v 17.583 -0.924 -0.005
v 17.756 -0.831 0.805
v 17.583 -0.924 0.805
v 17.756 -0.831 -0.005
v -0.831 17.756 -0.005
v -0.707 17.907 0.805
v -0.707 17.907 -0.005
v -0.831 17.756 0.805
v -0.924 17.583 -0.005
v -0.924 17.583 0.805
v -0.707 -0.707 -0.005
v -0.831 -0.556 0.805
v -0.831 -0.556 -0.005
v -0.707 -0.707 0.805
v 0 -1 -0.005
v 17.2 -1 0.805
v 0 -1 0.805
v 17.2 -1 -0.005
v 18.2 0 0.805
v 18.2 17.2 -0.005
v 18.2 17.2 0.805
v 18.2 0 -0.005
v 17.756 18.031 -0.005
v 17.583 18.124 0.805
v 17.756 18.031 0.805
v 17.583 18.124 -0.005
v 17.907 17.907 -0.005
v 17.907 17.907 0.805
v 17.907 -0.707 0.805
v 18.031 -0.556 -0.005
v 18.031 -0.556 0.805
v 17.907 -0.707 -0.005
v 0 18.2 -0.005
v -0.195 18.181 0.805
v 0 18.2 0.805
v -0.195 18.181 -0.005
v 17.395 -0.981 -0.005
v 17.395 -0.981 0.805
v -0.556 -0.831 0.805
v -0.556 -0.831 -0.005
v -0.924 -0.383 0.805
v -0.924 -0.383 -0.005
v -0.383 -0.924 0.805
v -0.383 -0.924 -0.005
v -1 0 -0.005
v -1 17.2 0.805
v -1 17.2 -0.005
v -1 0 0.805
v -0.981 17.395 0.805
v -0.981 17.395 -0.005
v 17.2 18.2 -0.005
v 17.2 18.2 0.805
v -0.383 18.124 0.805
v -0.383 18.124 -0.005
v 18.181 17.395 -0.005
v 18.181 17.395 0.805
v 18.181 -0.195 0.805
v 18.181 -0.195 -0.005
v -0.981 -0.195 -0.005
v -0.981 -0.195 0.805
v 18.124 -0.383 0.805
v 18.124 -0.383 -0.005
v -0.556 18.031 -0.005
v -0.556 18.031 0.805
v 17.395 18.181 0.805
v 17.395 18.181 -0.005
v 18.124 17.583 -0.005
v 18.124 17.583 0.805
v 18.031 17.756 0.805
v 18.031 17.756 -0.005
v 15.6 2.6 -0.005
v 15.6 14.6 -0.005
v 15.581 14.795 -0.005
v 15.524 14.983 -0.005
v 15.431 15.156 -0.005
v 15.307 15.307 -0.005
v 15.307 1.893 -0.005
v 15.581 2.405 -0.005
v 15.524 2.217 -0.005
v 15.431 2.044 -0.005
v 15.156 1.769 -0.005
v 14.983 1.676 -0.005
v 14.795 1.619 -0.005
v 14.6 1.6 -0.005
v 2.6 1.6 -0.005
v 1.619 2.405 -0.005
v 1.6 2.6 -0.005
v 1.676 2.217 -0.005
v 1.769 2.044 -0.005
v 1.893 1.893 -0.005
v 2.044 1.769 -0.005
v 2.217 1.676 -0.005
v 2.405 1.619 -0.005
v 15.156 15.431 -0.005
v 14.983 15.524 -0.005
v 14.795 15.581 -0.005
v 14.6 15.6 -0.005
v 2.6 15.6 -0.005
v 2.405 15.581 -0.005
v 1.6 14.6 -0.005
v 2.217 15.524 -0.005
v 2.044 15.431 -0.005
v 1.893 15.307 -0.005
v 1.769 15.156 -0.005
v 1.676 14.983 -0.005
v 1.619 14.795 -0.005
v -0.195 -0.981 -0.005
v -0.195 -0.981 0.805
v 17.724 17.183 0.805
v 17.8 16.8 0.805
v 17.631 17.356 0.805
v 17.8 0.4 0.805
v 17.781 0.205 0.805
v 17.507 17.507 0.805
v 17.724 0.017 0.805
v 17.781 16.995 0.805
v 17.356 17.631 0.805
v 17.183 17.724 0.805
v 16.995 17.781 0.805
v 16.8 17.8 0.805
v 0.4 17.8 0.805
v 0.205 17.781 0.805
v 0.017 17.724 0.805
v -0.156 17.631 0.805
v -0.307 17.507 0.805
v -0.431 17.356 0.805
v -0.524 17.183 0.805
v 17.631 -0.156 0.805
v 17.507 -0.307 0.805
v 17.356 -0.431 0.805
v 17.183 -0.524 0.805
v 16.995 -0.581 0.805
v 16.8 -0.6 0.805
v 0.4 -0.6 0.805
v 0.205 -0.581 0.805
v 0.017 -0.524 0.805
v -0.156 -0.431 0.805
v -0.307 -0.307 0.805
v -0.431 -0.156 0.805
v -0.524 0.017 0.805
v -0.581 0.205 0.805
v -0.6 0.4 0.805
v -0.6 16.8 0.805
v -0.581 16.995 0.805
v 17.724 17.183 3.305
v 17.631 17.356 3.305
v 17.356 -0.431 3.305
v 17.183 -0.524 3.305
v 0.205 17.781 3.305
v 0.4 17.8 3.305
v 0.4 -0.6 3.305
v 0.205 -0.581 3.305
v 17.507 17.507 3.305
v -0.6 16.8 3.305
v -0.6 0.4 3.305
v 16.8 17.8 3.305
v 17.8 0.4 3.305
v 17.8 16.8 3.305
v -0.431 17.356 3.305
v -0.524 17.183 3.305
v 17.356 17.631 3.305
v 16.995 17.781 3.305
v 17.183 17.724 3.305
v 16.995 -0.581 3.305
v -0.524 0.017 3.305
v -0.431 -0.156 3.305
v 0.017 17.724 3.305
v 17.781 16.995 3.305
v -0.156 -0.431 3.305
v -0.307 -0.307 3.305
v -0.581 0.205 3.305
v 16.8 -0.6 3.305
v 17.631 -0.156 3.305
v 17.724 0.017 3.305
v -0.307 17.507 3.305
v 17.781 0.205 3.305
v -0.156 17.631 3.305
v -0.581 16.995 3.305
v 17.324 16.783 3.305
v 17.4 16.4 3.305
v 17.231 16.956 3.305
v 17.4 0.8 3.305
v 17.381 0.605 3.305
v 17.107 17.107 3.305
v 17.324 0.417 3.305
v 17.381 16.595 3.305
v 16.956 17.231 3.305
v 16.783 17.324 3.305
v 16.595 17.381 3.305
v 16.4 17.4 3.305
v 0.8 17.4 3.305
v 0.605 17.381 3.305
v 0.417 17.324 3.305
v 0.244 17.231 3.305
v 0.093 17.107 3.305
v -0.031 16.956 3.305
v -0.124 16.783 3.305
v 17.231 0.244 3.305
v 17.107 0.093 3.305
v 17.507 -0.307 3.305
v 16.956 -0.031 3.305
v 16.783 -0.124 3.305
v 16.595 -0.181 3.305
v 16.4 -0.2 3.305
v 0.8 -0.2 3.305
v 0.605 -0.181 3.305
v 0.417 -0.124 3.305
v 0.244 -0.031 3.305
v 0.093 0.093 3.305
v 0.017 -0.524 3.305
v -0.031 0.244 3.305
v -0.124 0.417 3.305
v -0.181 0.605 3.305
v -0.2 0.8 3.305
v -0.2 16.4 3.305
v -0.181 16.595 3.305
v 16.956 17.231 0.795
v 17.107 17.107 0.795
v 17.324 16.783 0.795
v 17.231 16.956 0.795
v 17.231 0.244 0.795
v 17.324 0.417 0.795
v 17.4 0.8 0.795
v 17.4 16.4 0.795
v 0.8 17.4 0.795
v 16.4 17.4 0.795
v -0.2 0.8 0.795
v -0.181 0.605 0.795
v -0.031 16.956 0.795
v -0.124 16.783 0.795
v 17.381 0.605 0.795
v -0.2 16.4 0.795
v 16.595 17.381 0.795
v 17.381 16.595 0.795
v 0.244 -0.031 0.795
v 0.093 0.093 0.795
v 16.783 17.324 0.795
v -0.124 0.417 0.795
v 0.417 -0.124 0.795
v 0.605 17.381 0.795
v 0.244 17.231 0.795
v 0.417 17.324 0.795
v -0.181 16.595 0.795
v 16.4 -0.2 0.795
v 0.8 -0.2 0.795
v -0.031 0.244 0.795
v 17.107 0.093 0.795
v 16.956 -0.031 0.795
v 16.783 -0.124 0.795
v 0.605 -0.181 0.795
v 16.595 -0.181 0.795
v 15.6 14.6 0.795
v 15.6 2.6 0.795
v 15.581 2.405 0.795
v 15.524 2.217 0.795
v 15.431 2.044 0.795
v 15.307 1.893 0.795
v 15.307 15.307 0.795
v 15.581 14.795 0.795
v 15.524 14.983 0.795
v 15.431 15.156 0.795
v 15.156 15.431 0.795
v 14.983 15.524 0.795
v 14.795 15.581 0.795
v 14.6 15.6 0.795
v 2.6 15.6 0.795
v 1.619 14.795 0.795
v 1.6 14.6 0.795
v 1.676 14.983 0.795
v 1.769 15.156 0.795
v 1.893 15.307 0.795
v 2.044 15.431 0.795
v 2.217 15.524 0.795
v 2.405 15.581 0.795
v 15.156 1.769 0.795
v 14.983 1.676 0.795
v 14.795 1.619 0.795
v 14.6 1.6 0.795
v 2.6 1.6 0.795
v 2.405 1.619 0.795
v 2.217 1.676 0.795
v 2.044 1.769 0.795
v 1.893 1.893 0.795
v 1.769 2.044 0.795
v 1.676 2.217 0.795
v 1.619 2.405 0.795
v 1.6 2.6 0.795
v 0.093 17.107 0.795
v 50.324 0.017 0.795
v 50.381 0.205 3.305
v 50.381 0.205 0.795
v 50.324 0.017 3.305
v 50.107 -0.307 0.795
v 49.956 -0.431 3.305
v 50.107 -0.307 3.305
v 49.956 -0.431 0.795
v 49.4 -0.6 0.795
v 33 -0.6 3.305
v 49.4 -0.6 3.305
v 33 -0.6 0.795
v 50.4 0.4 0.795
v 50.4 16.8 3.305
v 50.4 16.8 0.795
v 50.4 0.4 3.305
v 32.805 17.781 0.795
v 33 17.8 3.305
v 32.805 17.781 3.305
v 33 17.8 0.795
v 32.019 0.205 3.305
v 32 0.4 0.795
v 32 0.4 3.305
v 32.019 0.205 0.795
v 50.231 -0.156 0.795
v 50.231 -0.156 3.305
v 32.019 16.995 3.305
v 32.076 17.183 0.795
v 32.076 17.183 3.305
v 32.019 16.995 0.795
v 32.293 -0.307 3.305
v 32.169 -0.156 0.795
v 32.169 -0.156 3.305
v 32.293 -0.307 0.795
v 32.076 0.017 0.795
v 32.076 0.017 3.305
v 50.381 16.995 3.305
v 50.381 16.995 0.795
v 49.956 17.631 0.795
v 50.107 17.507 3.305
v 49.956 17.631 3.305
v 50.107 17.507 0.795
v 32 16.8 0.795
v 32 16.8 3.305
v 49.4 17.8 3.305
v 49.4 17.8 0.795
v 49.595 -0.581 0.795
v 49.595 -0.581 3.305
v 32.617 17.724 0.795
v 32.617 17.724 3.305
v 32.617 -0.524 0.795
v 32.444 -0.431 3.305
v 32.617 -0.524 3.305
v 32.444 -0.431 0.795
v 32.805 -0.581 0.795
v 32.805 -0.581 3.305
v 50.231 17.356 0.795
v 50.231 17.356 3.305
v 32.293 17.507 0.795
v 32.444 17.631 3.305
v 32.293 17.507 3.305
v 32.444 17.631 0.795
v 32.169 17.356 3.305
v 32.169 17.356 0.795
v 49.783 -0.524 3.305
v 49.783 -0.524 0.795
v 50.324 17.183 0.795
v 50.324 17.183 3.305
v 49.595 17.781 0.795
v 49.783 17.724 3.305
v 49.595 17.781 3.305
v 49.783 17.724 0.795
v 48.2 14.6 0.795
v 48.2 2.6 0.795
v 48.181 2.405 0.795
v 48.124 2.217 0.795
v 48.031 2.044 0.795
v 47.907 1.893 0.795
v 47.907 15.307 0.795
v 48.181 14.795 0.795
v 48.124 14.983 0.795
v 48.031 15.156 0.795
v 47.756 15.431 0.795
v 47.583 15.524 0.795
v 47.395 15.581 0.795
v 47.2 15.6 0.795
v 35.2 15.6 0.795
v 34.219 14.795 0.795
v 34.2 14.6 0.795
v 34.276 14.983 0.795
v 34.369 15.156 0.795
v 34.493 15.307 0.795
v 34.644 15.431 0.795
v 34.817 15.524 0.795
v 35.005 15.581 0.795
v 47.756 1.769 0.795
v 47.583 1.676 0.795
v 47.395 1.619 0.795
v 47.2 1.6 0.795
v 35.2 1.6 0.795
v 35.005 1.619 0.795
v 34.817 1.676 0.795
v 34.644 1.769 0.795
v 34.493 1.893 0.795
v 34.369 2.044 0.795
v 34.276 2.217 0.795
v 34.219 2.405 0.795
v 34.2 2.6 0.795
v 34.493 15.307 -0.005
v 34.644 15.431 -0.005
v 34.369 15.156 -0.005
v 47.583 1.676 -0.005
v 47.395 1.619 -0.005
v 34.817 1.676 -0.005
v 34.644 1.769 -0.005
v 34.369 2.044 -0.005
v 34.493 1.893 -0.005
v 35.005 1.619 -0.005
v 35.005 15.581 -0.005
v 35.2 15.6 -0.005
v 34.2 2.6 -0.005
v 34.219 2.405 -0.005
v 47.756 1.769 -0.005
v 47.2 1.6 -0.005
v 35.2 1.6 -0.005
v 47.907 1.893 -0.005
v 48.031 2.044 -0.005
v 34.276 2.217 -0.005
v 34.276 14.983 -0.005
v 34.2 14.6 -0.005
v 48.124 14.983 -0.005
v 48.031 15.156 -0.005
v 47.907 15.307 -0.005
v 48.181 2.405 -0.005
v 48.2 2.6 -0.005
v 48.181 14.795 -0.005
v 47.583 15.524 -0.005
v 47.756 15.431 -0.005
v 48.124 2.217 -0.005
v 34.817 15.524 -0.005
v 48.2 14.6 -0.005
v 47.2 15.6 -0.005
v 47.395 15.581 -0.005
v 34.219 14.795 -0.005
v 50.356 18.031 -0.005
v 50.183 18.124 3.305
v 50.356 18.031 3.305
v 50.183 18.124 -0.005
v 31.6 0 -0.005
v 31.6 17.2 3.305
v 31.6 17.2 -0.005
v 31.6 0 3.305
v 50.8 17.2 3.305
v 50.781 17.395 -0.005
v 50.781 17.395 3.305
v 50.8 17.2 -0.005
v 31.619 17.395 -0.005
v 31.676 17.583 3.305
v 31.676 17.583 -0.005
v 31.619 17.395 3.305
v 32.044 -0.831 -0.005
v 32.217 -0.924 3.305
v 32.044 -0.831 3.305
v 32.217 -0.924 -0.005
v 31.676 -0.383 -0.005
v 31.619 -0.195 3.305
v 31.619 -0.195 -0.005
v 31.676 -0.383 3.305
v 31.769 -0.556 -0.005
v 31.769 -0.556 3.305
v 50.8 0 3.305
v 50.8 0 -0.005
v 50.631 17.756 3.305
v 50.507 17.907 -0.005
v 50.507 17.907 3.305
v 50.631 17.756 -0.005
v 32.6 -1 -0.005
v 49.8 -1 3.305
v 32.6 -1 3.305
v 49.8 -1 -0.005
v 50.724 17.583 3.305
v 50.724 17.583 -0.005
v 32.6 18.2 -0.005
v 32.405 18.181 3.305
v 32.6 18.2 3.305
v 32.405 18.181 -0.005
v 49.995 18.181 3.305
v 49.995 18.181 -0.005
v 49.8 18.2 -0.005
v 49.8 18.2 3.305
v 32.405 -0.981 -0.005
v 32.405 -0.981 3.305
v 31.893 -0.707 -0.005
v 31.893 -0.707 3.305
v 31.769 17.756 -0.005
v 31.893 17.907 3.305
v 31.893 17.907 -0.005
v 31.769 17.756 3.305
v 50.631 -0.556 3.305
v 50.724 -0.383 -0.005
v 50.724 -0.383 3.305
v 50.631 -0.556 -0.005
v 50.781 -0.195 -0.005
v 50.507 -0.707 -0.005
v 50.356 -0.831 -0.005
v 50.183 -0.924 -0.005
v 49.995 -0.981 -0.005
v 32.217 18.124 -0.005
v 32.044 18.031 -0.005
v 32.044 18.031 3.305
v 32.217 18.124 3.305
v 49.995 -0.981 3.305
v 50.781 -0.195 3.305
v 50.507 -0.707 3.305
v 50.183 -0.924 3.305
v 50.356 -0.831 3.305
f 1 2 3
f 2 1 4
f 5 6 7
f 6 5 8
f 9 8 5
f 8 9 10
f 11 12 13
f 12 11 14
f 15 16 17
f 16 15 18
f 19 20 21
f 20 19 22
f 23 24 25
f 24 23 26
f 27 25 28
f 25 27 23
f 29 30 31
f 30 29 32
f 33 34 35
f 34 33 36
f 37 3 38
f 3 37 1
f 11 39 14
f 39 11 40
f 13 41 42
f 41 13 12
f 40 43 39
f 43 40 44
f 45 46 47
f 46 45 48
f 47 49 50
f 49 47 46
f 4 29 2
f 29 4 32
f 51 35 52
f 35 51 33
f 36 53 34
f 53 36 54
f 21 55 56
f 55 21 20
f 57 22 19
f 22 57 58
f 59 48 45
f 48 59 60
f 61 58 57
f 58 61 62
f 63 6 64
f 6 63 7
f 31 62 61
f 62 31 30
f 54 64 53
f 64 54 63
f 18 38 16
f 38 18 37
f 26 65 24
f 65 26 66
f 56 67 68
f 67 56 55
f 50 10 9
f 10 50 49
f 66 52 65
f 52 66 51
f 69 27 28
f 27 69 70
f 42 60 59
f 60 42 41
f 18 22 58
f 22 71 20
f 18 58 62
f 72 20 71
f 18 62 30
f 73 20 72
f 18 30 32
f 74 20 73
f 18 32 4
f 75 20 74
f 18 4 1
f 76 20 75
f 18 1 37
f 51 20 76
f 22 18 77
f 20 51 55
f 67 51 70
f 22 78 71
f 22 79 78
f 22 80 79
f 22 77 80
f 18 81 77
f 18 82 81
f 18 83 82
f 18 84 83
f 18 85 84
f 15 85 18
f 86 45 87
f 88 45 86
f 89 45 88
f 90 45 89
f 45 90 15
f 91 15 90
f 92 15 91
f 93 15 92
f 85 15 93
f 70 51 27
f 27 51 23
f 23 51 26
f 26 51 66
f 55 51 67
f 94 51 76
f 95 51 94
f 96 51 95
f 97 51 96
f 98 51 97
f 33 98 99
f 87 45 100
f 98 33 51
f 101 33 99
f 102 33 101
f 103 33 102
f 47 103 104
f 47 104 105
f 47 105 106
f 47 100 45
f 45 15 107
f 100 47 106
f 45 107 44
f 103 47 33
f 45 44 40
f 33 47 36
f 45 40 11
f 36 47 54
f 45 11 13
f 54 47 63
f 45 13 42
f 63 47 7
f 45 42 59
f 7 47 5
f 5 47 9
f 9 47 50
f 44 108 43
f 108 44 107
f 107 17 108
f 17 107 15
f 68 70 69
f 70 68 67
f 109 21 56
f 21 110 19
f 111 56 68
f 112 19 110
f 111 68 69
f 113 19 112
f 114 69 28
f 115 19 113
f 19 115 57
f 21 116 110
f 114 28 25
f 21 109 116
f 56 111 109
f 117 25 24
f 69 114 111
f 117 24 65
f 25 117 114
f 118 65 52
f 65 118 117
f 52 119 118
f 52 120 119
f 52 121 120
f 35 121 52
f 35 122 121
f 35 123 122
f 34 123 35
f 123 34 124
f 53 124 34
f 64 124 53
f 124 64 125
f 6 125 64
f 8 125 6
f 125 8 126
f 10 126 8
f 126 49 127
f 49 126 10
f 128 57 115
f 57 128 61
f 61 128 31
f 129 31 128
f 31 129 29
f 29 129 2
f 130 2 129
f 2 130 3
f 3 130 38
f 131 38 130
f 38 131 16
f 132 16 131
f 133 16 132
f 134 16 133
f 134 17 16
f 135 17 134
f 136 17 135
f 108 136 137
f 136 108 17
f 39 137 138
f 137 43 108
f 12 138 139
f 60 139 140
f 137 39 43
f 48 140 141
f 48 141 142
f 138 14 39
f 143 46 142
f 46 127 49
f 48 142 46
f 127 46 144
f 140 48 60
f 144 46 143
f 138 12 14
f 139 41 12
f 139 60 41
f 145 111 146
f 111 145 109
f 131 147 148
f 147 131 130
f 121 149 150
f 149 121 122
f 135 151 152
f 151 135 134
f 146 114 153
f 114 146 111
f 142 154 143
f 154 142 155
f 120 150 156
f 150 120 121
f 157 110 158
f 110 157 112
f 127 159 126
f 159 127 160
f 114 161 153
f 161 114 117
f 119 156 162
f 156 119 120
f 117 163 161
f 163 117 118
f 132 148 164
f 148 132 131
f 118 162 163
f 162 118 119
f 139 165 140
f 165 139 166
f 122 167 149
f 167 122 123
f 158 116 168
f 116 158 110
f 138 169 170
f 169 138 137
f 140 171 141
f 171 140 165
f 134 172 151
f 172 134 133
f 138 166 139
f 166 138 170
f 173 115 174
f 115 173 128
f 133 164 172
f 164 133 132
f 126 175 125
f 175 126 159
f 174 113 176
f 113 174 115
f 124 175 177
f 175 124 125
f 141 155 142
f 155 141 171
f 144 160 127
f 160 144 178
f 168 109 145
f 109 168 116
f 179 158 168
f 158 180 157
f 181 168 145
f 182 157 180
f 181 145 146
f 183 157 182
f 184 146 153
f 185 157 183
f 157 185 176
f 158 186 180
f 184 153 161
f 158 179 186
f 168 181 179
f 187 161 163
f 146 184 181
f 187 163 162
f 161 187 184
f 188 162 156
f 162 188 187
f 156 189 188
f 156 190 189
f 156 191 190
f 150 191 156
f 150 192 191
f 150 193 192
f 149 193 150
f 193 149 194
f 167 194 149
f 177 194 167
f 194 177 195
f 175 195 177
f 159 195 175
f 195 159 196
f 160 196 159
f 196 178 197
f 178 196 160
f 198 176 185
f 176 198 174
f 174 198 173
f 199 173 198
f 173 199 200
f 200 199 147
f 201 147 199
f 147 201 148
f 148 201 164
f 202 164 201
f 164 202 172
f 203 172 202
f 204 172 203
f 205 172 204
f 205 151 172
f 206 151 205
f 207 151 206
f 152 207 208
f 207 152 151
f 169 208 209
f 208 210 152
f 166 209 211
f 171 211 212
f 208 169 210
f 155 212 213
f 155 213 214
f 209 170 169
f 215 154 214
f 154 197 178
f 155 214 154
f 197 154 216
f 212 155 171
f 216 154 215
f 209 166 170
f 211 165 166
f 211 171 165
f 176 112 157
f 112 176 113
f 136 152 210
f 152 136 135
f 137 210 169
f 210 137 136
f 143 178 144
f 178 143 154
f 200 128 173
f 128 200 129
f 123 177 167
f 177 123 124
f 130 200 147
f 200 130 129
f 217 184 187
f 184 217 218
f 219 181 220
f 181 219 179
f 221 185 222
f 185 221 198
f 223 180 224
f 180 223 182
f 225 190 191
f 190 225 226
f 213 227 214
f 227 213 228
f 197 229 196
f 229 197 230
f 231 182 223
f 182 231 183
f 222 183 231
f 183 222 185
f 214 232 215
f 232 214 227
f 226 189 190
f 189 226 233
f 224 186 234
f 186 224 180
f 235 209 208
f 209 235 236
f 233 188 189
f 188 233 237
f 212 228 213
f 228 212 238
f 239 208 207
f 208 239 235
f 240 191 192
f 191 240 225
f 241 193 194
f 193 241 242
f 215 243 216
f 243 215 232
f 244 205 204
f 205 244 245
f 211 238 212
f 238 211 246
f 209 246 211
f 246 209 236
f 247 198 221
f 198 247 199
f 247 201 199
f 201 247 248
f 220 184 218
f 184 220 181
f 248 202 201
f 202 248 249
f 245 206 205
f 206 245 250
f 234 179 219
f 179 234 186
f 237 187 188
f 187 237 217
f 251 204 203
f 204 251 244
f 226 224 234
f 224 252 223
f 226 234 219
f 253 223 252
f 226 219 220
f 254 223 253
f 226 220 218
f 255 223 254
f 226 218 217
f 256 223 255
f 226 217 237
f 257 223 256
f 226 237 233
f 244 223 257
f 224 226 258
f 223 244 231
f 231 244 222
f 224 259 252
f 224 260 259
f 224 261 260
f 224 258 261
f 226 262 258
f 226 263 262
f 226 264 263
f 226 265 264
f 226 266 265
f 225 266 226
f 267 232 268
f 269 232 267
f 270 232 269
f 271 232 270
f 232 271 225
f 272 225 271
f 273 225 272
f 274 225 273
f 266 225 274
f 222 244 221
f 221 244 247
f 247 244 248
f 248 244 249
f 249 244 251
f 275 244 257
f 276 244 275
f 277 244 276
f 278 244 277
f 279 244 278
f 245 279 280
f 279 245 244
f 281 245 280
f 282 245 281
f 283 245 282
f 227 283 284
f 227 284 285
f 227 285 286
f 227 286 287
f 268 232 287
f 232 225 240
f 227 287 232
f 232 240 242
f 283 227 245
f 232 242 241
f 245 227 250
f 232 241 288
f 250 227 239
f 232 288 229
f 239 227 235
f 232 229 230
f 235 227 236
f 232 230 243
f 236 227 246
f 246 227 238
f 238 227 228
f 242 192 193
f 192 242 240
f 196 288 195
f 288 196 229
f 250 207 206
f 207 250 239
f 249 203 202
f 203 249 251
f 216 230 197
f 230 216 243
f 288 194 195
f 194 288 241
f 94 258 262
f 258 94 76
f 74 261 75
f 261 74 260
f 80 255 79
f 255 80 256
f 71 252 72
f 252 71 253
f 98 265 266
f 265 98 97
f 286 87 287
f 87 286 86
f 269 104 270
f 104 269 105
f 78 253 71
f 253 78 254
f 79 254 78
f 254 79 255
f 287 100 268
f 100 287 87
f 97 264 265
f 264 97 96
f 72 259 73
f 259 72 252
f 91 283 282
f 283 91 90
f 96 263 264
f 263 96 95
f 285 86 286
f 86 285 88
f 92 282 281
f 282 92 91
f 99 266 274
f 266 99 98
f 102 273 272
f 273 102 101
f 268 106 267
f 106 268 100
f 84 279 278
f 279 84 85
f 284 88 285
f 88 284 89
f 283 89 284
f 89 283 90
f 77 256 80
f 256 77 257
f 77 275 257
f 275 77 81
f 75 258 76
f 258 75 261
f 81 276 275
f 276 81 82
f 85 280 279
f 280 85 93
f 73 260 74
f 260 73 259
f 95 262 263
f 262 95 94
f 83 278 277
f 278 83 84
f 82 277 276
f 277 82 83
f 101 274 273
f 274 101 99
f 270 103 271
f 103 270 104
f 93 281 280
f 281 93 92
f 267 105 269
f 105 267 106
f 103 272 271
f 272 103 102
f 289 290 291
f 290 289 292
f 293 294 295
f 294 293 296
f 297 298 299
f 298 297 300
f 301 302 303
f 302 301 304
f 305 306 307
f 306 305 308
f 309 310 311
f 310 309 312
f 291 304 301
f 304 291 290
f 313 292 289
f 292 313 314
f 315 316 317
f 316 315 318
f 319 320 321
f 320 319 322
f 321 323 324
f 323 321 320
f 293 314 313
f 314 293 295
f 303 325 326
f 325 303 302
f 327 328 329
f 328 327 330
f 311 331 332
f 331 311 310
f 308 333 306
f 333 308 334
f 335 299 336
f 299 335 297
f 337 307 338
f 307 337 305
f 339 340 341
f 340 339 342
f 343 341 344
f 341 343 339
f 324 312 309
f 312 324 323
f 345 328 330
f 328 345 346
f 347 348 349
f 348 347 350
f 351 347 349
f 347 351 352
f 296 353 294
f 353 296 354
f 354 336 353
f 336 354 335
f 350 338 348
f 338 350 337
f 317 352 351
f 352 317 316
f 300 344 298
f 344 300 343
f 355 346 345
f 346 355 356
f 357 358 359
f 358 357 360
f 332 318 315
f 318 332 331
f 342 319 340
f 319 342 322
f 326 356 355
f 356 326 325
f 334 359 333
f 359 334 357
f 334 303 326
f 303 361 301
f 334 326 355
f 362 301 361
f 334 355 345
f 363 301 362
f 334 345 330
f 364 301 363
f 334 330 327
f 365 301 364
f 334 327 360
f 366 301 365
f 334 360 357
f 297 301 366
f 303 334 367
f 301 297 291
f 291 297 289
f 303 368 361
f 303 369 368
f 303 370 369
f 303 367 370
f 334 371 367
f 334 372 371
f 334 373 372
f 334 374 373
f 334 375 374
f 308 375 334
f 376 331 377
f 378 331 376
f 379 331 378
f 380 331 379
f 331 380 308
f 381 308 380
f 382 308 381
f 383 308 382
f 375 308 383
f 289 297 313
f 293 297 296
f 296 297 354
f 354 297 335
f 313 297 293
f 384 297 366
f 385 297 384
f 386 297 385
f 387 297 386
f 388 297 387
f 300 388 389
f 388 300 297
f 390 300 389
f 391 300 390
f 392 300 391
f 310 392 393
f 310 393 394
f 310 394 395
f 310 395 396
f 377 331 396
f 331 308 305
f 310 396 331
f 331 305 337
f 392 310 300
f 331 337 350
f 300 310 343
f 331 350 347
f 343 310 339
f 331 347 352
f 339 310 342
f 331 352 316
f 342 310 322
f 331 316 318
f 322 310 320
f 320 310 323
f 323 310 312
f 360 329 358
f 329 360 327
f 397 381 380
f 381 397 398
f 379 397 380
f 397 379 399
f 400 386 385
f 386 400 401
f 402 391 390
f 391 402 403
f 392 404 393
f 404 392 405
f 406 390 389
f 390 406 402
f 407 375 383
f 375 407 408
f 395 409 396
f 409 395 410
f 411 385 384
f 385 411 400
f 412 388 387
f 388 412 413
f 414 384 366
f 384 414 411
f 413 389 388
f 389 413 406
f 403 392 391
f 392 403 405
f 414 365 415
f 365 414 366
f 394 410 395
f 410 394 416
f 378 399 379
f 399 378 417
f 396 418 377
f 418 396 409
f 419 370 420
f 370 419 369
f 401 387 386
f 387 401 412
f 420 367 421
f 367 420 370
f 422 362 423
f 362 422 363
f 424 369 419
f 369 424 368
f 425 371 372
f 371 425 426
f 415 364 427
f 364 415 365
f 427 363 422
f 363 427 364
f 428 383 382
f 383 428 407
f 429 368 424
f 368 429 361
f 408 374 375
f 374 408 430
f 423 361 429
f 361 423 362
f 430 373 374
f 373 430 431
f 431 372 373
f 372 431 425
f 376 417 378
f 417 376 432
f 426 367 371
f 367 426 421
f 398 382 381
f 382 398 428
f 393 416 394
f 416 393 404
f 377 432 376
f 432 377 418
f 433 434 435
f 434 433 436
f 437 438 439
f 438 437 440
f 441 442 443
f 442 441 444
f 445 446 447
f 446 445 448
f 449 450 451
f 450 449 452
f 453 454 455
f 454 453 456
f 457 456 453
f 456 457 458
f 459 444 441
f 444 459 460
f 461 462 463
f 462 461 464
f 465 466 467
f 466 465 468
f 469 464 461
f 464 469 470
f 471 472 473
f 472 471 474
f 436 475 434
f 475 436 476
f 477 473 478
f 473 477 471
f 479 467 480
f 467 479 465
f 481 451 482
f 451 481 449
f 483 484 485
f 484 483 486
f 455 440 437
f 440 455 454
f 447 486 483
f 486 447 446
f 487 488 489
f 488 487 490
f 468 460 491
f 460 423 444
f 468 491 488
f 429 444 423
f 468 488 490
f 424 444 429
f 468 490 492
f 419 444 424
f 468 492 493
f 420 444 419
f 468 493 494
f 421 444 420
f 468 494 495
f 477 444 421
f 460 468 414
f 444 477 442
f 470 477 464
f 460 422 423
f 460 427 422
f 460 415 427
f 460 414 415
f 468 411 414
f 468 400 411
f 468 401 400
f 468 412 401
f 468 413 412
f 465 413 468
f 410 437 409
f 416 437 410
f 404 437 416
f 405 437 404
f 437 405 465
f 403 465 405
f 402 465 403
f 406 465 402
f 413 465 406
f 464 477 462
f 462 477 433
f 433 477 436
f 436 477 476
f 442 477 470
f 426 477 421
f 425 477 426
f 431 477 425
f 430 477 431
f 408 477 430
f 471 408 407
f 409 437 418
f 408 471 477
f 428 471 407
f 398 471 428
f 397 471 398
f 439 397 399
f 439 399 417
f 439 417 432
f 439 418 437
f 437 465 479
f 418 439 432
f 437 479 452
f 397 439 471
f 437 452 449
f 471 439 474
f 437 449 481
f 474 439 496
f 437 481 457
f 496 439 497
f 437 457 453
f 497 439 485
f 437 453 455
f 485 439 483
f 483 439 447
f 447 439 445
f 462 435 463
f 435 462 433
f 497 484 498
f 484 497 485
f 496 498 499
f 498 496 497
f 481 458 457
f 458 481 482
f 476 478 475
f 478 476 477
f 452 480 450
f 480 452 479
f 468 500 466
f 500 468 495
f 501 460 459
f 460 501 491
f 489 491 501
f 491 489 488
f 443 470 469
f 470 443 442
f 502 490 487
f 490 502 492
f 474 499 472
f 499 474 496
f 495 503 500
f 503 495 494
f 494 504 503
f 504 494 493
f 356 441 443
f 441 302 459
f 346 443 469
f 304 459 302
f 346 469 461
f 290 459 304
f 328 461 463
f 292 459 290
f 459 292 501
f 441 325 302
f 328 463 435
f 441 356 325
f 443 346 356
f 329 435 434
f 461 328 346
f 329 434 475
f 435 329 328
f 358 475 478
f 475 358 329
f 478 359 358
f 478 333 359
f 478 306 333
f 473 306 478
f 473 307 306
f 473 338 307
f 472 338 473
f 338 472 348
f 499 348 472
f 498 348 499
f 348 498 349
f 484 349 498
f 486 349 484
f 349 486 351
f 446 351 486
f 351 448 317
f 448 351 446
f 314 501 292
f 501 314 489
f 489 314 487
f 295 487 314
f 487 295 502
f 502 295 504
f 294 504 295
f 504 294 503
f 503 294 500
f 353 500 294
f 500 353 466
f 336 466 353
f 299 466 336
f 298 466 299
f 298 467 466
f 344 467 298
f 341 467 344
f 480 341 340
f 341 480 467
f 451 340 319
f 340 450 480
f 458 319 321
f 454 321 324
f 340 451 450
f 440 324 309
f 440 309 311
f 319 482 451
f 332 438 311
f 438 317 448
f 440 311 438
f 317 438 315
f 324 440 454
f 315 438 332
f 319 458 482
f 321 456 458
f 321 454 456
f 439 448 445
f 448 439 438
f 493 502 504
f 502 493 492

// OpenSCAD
/* [General] */

Generate_top = true;
Generate_bottom = true;
Bottom_window = true;

// Size of the Chamfer (0 - disable)
Chamfer_size = 1; // [0:1:9]

/* [Extrusion] */

// Width of the nozzle
Extrusion_width = 0.4; // [0.1:0.1:1.0]
// Extrusion lines per wall
Extrusion_lines = 2;  // [1:1:10]

/* [Token parameters] */

// Height of the token in mm
Token_height = 2.5;

// Token height
Token_length = 17.6;

// Token width
Token_width = 17.6;

// Horizontal distance from the edge to window
Capsule_window_frame_length = 14;
// Vertical distance from the edge to window
Capsule_window_frame_width = 14;

//------------------------ DERIVED CONSTANTS ------------------------
wall_width = Extrusion_width * Extrusion_lines;
lower_lip_height = Extrusion_width * Extrusion_lines;

capsule_height = Token_height + lower_lip_height;
window_length = Token_length - Capsule_window_frame_length;
window_width = Token_width - Capsule_window_frame_width;


//------------------------ MODULES ------------------------
module rounded_cube(size, radius) {
    minkowski() {
        cube(size - [radius*2, radius*2, 0]);
        cylinder(r = radius, h = 0.01, center = true, $fn = 32);
    }
}

module base_capsule() {
    difference() {
        union() {
            // lip base
            translate([0, 0, 0]) {
                rounded_cube([Token_length + wall_width * 2, Token_width + wall_width * 2, lower_lip_height], Chamfer_size);
            }
            // token container
            translate([wall_width / 2, wall_width / 2, lower_lip_height]) {
                rounded_cube([Token_length + wall_width, Token_width + wall_width, Token_height], Chamfer_size);
            }
        }

        if (Bottom_window) {
            union() {
                translate([0, 0, Token_height]) {
                    translate([wall_width, wall_width, -Token_height + lower_lip_height]) {
                        rounded_cube([Token_length, Token_width, Token_height * 2], Chamfer_size);
                    }
                    translate([wall_width + window_length / 2, wall_width + window_width / 2, -capsule_height * 3 / 2]) {
                        rounded_cube([Token_length - window_length, Token_width - window_width, capsule_height * 3], Chamfer_size);
                    }
                }
            }
        } else {
            translate([wall_width, wall_width, lower_lip_height]) {
                rounded_cube([Token_length, Token_width, Token_height * 2], Chamfer_size);
            }
        }
    }
}

module top_capsule() {
    translate([Token_length + 15, 0, 0]) {
        difference() {
            union() {
                rounded_cube([Token_length + wall_width * 2, Token_width + wall_width * 2, Token_height + lower_lip_height], Chamfer_size);
            }
            union() {
                translate([wall_width / 2, wall_width / 2, lower_lip_height]) {
                    // +1 for z-fighting to disappear
                    rounded_cube([Token_length + wall_width, Token_width + wall_width, Token_height + 1], Chamfer_size);
                }
                translate([wall_width + window_length / 2, wall_width + window_width / 2, -1]) {
                    // -1 for z-fighting to disappear
                    rounded_cube([Token_length - window_length, Token_width - window_width, capsule_height], Chamfer_size);
                }
            }
        }
    }
}

//------------------------ MAIN EXECUTION ------------------------
if (Generate_bottom) {
    base_capsule();
}
if (Generate_top) {
    top_capsule();
}
